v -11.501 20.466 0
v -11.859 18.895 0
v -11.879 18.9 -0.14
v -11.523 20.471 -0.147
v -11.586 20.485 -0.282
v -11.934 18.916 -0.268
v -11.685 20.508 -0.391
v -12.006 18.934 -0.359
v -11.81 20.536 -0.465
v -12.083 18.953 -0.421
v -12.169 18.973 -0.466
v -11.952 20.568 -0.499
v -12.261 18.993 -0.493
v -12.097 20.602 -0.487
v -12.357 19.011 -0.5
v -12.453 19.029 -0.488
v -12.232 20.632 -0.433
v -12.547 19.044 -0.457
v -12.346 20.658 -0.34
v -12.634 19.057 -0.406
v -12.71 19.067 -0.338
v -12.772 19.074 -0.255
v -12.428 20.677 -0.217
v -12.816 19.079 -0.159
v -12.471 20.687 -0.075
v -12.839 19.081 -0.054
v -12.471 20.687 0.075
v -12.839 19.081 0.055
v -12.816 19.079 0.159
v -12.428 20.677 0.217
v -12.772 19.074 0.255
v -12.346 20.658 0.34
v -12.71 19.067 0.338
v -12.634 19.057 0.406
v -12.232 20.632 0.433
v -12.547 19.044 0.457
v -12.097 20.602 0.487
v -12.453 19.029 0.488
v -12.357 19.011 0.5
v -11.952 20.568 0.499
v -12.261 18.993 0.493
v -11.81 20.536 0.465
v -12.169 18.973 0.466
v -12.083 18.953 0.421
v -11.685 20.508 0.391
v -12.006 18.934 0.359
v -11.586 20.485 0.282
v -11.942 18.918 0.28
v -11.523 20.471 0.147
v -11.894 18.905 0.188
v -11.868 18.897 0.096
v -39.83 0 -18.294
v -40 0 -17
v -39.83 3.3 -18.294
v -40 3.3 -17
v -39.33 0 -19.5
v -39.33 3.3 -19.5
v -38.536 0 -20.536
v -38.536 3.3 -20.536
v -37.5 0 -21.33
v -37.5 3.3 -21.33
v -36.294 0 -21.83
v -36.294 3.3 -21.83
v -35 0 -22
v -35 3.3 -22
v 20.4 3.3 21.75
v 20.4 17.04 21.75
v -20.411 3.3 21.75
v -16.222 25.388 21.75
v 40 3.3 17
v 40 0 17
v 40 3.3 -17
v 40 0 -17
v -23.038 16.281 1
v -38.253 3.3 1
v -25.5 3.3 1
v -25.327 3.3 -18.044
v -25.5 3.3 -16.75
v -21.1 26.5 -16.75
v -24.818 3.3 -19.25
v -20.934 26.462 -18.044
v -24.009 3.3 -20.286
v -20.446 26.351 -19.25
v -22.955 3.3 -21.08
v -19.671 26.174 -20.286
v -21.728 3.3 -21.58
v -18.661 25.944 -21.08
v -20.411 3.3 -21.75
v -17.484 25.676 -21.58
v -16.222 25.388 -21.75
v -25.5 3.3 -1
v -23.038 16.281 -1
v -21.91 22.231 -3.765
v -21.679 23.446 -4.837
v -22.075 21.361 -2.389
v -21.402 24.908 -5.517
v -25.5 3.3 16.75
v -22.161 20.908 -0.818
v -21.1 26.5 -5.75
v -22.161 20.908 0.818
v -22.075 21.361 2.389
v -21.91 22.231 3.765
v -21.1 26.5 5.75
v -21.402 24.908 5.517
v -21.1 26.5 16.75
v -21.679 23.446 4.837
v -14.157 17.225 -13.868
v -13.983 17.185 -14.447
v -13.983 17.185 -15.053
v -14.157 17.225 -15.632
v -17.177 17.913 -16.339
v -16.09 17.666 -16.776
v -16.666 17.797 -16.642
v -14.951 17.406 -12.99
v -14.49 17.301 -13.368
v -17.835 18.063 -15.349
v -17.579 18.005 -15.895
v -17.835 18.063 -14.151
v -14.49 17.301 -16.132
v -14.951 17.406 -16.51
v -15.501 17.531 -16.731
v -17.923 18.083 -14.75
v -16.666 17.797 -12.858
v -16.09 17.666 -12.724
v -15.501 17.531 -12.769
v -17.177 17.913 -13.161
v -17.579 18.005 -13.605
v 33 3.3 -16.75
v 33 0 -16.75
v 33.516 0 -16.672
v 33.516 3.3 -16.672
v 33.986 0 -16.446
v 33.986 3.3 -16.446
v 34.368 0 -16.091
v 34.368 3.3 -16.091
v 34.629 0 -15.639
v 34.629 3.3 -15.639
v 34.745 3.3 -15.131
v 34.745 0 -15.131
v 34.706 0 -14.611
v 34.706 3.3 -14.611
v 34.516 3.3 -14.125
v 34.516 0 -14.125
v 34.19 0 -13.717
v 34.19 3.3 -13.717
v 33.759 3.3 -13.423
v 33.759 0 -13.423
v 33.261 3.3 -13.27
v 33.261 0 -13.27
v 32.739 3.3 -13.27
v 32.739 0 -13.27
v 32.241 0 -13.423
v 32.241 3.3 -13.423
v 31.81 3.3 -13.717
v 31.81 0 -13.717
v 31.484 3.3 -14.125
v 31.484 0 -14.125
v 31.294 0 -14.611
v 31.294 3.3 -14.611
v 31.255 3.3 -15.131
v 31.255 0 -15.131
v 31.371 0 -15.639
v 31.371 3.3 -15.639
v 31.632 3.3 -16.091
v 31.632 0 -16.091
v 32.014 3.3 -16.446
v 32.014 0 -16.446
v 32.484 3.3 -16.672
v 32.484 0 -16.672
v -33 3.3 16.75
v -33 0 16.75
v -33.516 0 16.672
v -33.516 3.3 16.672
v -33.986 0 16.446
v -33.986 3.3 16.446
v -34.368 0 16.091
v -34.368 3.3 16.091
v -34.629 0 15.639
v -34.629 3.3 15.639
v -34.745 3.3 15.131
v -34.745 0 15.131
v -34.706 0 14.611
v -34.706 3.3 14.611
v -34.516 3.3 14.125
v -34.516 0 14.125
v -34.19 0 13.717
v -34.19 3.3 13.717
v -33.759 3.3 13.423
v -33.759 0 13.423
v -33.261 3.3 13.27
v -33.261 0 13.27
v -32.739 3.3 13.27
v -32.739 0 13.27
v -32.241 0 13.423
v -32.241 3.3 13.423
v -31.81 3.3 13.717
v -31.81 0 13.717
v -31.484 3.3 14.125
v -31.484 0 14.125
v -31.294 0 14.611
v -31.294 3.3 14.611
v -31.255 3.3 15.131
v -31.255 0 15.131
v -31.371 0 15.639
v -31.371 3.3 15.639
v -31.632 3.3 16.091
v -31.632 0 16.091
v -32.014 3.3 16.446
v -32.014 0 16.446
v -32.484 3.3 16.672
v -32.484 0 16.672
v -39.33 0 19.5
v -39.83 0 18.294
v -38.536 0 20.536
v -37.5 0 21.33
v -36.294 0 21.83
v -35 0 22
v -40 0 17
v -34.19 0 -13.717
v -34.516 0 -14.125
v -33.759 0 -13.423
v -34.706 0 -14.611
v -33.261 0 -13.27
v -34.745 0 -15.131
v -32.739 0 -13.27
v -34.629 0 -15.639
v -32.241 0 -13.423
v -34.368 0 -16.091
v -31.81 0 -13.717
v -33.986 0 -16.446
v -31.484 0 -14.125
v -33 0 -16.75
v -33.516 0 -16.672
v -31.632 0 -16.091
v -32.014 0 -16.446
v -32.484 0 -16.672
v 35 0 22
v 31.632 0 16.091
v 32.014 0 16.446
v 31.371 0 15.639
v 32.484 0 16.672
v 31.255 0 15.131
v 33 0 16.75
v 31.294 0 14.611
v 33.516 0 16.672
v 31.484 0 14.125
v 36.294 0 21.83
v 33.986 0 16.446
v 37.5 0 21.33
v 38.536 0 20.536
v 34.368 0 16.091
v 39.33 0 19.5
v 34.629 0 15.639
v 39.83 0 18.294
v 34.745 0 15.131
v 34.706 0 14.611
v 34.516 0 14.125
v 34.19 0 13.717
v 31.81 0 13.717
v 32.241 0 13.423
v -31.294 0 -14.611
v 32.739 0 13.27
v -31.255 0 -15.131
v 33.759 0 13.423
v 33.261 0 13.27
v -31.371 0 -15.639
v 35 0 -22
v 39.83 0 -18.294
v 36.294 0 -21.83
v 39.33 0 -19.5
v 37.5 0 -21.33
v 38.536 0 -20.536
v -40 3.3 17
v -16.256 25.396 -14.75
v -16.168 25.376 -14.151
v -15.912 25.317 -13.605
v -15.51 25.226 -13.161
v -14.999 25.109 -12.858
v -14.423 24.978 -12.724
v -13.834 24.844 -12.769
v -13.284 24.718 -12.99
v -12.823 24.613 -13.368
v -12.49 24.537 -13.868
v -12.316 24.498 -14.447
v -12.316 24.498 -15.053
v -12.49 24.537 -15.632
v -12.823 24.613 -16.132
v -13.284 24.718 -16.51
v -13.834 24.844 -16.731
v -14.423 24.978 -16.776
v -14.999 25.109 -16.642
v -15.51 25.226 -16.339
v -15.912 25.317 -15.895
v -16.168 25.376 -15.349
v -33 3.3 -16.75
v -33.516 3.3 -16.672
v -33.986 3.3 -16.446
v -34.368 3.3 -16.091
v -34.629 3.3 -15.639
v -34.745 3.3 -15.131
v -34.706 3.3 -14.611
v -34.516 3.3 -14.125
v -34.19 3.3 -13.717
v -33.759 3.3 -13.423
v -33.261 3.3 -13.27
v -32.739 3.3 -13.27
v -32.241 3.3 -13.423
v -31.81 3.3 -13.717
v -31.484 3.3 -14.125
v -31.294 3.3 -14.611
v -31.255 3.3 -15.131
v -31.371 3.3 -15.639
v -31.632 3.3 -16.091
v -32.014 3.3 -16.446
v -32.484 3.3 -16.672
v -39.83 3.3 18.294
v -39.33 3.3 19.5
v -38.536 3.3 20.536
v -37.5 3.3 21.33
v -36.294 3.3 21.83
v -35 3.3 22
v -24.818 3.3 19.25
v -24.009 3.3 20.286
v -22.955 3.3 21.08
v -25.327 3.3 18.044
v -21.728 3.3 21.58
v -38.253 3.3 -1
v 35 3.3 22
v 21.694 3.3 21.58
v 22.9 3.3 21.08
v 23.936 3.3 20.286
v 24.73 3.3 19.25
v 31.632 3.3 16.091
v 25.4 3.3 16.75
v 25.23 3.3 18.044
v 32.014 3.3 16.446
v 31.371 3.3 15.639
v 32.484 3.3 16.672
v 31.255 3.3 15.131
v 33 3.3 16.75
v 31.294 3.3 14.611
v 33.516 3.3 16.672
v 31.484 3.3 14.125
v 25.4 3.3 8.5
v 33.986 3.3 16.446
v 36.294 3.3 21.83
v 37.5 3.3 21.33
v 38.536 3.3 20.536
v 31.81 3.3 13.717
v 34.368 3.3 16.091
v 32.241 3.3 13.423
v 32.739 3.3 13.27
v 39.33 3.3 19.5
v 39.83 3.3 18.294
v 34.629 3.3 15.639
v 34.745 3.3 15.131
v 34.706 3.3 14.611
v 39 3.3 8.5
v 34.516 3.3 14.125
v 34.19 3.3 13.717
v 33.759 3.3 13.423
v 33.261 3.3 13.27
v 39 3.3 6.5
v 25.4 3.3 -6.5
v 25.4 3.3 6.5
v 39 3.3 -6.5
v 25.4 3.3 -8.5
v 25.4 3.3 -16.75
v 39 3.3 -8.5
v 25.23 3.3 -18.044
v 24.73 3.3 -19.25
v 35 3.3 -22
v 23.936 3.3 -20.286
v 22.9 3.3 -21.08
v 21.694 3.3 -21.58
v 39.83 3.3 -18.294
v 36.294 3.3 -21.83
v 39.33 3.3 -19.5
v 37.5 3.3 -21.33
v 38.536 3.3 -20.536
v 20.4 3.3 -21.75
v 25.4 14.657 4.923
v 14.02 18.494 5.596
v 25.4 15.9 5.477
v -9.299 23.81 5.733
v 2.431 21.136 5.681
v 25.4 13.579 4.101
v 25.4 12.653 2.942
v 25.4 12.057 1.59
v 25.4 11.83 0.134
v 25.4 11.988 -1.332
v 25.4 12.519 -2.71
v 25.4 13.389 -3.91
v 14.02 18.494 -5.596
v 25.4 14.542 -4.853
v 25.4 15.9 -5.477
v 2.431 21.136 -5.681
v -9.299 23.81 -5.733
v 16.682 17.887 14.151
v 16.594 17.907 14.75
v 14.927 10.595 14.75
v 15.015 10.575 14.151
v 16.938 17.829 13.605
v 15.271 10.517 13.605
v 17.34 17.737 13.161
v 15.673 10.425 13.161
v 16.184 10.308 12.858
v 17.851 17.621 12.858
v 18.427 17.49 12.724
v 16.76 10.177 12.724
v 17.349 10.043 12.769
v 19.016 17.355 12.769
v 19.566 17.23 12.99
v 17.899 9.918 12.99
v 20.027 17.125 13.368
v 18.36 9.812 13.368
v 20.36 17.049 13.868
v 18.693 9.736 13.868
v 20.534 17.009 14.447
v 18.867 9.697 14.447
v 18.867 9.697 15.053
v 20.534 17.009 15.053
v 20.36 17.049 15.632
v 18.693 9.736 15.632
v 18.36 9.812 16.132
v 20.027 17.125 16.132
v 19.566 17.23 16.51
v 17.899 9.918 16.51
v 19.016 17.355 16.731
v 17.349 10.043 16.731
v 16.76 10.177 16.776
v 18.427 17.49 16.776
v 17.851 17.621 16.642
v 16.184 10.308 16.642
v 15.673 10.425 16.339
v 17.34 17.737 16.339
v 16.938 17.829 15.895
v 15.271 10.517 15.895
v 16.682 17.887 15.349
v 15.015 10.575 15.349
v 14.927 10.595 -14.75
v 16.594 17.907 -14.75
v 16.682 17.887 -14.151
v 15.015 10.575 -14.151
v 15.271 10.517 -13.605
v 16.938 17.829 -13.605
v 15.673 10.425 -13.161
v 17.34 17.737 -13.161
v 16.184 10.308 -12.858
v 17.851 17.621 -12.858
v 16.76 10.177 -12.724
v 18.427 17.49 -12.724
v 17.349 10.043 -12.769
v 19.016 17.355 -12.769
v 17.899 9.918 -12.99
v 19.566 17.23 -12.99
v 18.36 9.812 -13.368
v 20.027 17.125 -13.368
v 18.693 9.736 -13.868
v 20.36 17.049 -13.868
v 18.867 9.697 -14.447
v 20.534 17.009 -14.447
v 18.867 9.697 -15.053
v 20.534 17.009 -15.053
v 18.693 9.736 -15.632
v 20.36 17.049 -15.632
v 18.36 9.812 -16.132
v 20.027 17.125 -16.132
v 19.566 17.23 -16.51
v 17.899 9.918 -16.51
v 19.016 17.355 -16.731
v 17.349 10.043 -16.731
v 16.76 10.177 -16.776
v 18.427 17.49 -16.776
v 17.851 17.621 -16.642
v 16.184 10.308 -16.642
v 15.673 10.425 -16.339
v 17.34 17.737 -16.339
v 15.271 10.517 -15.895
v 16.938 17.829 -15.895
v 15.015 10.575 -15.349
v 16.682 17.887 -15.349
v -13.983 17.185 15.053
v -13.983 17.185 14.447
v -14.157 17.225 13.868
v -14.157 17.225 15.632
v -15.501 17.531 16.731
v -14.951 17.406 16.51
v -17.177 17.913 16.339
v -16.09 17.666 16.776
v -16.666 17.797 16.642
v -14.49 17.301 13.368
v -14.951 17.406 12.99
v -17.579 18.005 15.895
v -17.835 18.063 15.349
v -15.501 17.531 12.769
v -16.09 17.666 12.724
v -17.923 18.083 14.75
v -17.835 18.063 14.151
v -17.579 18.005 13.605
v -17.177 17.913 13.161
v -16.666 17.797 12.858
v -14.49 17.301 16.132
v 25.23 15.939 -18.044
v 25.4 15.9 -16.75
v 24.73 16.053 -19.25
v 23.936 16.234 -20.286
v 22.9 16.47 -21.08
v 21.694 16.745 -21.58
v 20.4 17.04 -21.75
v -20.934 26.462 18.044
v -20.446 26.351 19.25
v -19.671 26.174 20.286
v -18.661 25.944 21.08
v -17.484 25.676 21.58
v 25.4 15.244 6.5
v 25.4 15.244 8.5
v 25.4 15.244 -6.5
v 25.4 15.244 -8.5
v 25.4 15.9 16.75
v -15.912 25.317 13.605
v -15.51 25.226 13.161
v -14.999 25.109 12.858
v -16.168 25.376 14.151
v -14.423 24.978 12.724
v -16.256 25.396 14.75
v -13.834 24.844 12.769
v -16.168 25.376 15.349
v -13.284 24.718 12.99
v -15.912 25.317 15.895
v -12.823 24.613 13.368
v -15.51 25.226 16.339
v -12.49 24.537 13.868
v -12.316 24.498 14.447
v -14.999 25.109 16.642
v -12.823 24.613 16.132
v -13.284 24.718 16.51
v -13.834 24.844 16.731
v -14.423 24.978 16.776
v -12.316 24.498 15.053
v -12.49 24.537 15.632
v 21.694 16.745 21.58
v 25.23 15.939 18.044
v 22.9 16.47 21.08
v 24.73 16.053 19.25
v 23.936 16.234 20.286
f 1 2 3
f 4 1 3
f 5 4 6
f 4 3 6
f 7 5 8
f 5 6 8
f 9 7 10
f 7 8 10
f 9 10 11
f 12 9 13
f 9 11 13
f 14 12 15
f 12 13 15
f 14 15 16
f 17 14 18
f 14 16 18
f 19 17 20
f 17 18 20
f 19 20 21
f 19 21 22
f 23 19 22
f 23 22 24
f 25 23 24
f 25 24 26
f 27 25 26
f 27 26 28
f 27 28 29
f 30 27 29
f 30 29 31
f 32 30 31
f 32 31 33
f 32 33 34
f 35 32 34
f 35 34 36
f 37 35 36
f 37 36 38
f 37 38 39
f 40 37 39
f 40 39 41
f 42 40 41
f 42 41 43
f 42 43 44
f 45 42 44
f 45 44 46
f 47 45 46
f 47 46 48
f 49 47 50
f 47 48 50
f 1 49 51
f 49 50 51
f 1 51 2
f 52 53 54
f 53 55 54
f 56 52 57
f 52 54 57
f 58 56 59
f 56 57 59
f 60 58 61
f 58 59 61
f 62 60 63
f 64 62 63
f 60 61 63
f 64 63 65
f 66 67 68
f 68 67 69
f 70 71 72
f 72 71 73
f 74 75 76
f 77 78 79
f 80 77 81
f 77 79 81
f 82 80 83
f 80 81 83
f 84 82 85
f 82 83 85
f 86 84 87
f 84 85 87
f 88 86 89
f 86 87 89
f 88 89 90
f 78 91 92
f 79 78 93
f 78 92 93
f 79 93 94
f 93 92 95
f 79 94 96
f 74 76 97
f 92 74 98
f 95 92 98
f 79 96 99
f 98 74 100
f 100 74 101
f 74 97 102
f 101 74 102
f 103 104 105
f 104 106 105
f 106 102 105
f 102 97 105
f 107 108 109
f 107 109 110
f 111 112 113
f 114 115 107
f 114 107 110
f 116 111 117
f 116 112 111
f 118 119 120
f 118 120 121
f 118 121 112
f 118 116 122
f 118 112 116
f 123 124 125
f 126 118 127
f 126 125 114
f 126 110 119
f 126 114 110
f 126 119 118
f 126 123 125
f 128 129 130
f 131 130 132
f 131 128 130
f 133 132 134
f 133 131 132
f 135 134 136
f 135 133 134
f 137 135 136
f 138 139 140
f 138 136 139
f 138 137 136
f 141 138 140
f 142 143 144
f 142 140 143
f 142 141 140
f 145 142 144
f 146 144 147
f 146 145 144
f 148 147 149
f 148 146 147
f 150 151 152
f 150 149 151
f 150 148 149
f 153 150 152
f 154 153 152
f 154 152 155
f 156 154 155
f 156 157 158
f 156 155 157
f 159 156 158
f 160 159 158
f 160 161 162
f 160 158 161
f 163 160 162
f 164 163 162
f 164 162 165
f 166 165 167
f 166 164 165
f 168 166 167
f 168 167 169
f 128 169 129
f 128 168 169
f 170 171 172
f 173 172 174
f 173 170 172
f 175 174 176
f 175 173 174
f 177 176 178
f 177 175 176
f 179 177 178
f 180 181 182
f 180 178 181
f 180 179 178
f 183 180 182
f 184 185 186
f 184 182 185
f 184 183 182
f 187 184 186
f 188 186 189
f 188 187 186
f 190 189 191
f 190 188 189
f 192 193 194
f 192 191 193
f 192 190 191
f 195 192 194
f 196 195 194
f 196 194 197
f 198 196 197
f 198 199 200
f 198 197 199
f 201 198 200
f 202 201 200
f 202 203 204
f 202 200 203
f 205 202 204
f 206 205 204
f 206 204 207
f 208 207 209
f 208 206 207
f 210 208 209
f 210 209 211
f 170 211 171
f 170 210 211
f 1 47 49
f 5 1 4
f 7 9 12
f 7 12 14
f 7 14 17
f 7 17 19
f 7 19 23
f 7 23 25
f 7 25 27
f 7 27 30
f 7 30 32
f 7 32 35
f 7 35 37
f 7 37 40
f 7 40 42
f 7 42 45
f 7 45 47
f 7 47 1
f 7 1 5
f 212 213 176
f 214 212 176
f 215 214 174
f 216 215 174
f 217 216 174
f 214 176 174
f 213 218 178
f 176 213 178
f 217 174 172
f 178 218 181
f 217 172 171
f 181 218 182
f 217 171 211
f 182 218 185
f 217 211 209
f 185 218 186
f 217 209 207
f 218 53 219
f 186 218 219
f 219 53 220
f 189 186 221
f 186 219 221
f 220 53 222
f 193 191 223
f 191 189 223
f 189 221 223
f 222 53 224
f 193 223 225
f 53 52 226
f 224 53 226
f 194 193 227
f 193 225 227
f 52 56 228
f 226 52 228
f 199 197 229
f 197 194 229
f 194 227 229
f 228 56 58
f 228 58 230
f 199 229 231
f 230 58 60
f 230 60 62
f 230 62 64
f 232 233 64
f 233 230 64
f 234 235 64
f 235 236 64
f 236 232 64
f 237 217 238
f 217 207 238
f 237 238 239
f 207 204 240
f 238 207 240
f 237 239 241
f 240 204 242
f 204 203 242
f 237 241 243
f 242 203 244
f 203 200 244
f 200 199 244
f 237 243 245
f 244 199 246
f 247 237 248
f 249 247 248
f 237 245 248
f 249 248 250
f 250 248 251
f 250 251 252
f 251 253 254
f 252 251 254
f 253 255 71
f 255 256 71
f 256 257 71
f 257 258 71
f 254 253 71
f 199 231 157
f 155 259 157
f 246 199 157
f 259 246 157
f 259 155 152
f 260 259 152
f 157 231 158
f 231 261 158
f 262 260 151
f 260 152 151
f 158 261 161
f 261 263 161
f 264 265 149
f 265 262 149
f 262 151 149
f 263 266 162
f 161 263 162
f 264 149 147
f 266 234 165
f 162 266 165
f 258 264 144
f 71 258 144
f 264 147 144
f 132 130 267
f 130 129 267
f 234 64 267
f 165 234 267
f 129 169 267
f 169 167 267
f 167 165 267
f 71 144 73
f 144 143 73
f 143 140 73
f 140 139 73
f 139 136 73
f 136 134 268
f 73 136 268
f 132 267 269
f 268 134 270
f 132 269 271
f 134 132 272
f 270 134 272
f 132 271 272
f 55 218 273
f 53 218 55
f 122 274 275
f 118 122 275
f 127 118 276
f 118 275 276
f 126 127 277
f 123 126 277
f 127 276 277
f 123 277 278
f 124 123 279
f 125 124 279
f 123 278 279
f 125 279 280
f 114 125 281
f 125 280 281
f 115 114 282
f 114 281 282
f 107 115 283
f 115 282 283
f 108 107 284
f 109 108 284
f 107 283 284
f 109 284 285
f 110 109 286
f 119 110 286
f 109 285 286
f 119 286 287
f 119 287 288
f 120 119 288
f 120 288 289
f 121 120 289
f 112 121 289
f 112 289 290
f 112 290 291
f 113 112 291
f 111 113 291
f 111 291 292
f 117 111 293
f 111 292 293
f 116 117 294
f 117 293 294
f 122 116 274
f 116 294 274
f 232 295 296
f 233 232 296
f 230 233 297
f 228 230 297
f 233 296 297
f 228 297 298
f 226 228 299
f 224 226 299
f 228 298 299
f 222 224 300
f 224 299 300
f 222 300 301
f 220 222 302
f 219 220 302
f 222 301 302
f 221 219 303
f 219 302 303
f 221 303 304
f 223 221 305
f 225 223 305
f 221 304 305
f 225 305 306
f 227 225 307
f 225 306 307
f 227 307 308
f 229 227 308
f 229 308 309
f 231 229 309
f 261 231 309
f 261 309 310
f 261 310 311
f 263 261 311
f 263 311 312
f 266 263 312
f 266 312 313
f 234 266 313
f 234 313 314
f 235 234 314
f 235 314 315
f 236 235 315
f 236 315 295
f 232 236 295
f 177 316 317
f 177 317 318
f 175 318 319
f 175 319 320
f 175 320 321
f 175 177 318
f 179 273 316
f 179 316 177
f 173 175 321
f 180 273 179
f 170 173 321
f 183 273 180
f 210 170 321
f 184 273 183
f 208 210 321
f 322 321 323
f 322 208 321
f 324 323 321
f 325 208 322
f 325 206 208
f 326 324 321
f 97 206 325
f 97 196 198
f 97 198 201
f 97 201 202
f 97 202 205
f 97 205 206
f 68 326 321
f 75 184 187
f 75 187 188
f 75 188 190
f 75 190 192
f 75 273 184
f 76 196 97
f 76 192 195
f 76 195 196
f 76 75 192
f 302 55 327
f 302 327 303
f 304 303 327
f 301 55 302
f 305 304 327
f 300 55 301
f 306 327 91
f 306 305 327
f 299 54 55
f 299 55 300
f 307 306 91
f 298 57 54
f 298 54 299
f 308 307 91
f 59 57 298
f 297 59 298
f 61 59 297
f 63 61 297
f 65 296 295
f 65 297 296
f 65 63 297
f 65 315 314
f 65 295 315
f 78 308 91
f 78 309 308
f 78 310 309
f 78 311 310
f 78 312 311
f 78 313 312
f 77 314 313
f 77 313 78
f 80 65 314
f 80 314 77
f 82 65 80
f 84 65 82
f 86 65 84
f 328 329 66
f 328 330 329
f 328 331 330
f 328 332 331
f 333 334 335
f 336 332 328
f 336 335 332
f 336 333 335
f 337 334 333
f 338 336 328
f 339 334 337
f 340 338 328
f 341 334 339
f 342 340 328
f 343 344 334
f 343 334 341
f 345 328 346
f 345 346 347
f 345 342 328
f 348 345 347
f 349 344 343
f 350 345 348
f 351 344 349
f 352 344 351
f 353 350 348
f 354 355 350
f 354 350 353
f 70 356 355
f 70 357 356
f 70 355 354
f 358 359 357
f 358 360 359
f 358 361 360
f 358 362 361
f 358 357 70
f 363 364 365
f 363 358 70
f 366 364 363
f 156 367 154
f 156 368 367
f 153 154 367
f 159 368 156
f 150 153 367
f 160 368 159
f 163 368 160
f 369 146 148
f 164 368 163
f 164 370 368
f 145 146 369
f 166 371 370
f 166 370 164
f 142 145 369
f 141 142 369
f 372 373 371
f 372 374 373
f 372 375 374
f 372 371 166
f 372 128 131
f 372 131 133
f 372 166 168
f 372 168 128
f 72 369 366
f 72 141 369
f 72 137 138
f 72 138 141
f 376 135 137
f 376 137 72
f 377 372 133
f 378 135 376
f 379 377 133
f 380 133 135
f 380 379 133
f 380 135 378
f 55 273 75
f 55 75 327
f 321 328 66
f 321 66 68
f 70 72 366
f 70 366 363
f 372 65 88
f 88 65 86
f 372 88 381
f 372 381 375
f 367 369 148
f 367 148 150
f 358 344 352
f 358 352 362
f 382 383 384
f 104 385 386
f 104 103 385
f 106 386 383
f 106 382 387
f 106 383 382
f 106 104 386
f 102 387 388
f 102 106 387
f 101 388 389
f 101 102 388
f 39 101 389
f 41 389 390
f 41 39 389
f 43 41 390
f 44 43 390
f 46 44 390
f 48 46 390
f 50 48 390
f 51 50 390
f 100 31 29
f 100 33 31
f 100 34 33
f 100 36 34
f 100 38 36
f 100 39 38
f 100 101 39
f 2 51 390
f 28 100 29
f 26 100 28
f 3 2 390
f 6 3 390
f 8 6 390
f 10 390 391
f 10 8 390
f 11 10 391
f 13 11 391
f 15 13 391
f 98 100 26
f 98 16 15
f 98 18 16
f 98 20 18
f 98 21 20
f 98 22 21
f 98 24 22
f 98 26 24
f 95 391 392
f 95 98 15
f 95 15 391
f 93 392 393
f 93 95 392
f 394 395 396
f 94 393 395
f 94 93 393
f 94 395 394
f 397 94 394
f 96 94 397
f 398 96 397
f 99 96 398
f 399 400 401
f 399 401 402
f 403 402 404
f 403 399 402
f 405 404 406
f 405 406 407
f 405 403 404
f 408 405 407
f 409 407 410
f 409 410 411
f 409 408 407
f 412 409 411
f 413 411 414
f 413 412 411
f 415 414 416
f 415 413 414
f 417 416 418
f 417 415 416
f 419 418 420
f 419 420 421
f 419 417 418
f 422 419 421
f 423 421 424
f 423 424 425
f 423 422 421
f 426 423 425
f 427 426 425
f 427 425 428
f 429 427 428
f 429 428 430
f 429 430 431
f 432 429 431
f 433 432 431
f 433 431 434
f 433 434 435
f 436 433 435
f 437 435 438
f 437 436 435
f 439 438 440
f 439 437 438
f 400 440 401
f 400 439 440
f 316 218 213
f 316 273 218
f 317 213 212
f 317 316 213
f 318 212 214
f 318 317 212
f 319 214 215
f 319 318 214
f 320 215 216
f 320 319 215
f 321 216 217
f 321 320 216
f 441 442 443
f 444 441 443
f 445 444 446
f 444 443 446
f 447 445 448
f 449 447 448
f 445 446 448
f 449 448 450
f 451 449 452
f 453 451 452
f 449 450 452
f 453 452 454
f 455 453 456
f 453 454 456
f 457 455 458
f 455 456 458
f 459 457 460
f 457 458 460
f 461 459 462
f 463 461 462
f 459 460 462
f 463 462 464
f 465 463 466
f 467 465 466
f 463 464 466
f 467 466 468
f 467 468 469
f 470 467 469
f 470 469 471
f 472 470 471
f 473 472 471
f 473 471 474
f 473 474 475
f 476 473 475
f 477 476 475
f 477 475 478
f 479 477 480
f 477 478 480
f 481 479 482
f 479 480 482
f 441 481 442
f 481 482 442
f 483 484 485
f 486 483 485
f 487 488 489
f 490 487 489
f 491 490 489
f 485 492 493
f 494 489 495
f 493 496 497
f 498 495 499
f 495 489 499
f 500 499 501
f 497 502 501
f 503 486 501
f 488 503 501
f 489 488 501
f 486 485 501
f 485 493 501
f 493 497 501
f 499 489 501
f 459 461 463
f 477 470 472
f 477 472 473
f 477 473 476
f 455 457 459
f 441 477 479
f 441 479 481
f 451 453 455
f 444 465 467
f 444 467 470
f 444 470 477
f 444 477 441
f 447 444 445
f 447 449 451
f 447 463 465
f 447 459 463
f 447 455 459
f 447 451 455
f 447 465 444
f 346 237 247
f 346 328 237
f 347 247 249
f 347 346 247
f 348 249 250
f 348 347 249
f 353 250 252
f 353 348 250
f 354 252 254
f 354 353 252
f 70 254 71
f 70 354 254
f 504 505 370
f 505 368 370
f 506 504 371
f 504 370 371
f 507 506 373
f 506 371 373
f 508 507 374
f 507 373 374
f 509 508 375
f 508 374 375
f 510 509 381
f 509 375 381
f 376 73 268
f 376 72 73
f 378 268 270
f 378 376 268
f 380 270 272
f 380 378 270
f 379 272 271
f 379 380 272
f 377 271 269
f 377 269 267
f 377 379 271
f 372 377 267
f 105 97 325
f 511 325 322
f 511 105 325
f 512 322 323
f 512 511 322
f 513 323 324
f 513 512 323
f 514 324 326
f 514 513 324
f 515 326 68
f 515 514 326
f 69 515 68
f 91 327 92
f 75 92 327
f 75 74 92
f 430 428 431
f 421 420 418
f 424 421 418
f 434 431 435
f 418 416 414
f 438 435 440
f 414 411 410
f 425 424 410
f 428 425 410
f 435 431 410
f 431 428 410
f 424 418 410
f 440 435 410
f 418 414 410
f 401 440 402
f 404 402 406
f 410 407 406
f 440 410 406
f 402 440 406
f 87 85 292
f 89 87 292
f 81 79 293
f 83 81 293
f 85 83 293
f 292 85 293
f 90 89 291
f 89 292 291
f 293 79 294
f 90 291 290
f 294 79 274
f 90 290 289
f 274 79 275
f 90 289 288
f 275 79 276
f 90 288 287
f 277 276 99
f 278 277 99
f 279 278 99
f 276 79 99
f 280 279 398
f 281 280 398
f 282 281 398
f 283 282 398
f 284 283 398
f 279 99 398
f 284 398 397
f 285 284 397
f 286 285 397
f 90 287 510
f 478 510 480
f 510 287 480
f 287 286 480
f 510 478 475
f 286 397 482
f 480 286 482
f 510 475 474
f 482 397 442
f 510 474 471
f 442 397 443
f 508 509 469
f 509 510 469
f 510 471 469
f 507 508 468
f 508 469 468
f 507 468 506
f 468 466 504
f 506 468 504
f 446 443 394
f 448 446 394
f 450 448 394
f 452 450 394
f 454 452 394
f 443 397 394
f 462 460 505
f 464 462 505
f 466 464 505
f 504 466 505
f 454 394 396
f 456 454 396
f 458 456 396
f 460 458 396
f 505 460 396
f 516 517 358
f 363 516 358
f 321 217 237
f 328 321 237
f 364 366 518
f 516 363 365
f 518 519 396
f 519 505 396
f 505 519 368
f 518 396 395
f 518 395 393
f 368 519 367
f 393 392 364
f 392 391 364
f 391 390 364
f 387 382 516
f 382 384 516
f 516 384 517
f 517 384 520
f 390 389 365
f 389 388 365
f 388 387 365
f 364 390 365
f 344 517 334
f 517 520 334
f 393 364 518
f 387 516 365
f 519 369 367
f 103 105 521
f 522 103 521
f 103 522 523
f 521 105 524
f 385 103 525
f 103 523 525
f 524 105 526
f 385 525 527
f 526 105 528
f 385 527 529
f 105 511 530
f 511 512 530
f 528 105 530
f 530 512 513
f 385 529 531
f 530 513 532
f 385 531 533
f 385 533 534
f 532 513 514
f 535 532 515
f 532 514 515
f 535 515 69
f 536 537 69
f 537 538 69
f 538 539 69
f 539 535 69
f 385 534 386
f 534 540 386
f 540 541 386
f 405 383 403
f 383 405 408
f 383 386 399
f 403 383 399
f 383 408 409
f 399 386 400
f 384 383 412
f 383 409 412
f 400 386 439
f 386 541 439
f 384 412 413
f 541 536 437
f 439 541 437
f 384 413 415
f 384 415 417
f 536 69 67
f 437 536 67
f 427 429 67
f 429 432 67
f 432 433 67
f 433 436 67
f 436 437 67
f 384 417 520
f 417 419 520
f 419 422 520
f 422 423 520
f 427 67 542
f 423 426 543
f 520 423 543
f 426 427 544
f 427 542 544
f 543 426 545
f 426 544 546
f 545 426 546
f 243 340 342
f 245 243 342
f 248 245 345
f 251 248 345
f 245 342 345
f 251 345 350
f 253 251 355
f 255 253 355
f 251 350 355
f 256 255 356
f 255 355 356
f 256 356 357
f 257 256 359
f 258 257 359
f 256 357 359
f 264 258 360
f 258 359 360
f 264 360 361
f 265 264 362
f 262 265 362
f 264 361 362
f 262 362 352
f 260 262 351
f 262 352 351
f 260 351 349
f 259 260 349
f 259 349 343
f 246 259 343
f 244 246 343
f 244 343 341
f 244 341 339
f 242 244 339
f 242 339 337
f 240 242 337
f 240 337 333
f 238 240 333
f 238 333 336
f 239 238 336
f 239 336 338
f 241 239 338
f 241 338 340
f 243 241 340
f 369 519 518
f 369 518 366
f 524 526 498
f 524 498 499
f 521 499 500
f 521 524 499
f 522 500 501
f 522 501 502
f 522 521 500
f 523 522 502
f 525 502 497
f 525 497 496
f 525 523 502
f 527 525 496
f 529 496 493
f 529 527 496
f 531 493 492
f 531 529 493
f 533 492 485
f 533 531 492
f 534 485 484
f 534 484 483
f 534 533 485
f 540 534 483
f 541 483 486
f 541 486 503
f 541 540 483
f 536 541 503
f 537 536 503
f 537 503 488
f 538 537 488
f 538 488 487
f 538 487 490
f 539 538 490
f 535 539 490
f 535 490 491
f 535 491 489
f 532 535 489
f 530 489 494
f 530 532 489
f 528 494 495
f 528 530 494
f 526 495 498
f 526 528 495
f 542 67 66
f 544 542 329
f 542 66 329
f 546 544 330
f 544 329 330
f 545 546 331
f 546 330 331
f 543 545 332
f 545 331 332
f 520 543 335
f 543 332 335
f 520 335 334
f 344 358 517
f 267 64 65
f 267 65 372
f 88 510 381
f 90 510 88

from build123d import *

# Parameters (mm, degrees)
SKETCH2_W               = 80
SKETCH2_H               = 44
BOSS_EXTRUDE1_DEPTH     = 3.3
FILLET1_R               = 5
SKETCH3_R               = 1.75
CUT_EXTRUDE1_DEPTH      = 46.76996832
MIRROR2_COPY_1_SKETCH_R = 1.75
MIRROR2_COPY_1_DEPTH    = 46.76996832
BOSS_EXTRUDE2_DEPTH     = 21.75
FILLET2_R               = 5
CUT_EXTRUDE2_DEPTH      = 73.174242058
BOSS_EXTRUDE3_START     = -5.75
SKETCH10_R              = 0.5
BOSS_EXTRUDE3_DEPTH     = 2
BOSS_EXTRUDE4_DEPTH     = 1
BOSS_EXTRUDE5_DEPTH     = 1
SKETCH15_R              = 2.032
CUT_EXTRUDE3_DEPTH      = 7.5


with BuildPart() as part:
    # Sketch2 → Boss-Extrude1 (new body)
    with BuildSketch(Plane(origin=(0, 0, 0), x_dir=(1, 0, 0), z_dir=(0, 1, 0))):
        Rectangle(SKETCH2_W, SKETCH2_H)
    extrude(amount=BOSS_EXTRUDE1_DEPTH)

    # Fillet1
    fillet1_edges = [part.edges().sort_by_distance(p)[0] for p in [
        (40, 1.65, 22),
        (-40, 1.65, 22),
        (-40, 1.65, -22),
        (40, 1.65, -22),
    ]]
    fillet(fillet1_edges, radius=FILLET1_R)

    # Sketch3 → Cut-Extrude1 (cut, through all)
    with BuildSketch(Plane(origin=(0, 3.3, 0), x_dir=(1, 0, 0), z_dir=(0, 1, 0))):
        with Locations(Location((33, -15, 0), (0, 0, 270))):
            Circle(SKETCH3_R)
    cut_extrude1 = extrude(amount=-CUT_EXTRUDE1_DEPTH, mode=Mode.SUBTRACT)

    # Mirror1: Cut-Extrude1 across plane
    add(cut_extrude1.mirror(Plane.XY), mode=Mode.SUBTRACT)

    # Mirror2: Cut-Extrude1 across plane
    add(cut_extrude1.mirror(Plane(origin=(0, 0, 0), x_dir=(0, 0, 1), z_dir=(1, 0, 0))), mode=Mode.SUBTRACT)

    # Mirror2 copy 1 sketch → Mirror2 copy 1 (cut, through all)
    with BuildSketch(Plane(origin=(0, 3.3, 0), x_dir=(-1, 0, 0), z_dir=(0, 1, 0))):
        with Locations(Location((33, -15, 0), (0, 0, 270))):
            Circle(MIRROR2_COPY_1_SKETCH_R)
    extrude(amount=-MIRROR2_COPY_1_DEPTH, mode=Mode.SUBTRACT)

    # Sketch4 → Boss-Extrude2 (add, symmetric)
    with BuildSketch(Plane.XY):
        Polygon((-25.5, 3.3), (-21.1, 26.5), (25.4, 15.9), (25.4, 3.3), align=None)
    extrude(amount=BOSS_EXTRUDE2_DEPTH, both=True)

    # Fillet2
    fillet2_edges = [part.edges().sort_by_distance(p)[0] for p in [
        (25.4, 9.6, -21.75),
        (-23.3, 14.9, -21.75),
        (25.4, 9.6, 21.75),
        (-23.3, 14.9, 21.75),
    ]]
    fillet(fillet2_edges, radius=FILLET2_R)

    # Sketch9 → Cut-Extrude2 (cut, through all)
    with BuildSketch(Plane(origin=(-25.218766141, 4.78286944, 0), x_dir=(0, 0, 1), z_dir=(-0.9824865243069563, 0.18633365116166412, 0))):
        with BuildLine():
            Line((-5.75, 22.104252855), (5.75, 22.104252855))
            ThreePointArc((5.75, 22.104252855), (0, 16.354252855), (-5.75, 22.104252855))
        make_face()
    extrude(amount=-CUT_EXTRUDE2_DEPTH, mode=Mode.SUBTRACT)

    # Sketch10 → Boss-Extrude3 (add)
    with BuildSketch(Plane(origin=(4.700170139, 20.618670893, 0), x_dir=(0.9749884721737534, -0.22225543666756517, 0), z_dir=(0.2222554366675652, 0.9749884721737535, 0)).offset(BOSS_EXTRUDE3_START)):
        with Locations((-16.262025835, 0)):
            Circle(SKETCH10_R)
    extrude(amount=BOSS_EXTRUDE3_DEPTH)

    # Sketch12 → Boss-Extrude4 (add, symmetric)
    with BuildSketch(Plane.XY):
        Polygon((-23.038031878, 16.281286463), (-38.252702488, 3.3), (-25.5, 3.3), align=None)
    extrude(amount=BOSS_EXTRUDE4_DEPTH, both=True)

    # Sketch14 → Boss-Extrude5 (add, symmetric)
    with BuildSketch(Plane.XY.offset(7.5)):
        Polygon((25.4, 15.243617542), (39, 3.3), (25.4, 3.3), align=None)
    boss_extrude5 = extrude(amount=BOSS_EXTRUDE5_DEPTH, both=True)

    # Mirror3: Boss-Extrude5 across plane
    add(boss_extrude5.mirror(Plane.XY))

    # Sketch15 → Cut-Extrude3 (cut)
    with BuildSketch(Plane(origin=(4.700170139, 20.618670893, 0), x_dir=(0.9749884721737534, -0.22225543666756517, 0), z_dir=(0.2222554366675652, 0.9749884721737535, 0))):
        with Locations(Location((-19.462025835, 14.75, 0), (0, 0, 180))):
            Circle(SKETCH15_R)
        with Locations(Location((14.23084575, 14.75, 0), (0, 0, 180))):
            Circle(SKETCH15_R)
    cut_extrude3 = extrude(amount=-CUT_EXTRUDE3_DEPTH, mode=Mode.SUBTRACT)

    # Mirror4: Cut-Extrude3 across plane
    add(cut_extrude3.mirror(Plane.XY), mode=Mode.SUBTRACT)


solid = part.part
